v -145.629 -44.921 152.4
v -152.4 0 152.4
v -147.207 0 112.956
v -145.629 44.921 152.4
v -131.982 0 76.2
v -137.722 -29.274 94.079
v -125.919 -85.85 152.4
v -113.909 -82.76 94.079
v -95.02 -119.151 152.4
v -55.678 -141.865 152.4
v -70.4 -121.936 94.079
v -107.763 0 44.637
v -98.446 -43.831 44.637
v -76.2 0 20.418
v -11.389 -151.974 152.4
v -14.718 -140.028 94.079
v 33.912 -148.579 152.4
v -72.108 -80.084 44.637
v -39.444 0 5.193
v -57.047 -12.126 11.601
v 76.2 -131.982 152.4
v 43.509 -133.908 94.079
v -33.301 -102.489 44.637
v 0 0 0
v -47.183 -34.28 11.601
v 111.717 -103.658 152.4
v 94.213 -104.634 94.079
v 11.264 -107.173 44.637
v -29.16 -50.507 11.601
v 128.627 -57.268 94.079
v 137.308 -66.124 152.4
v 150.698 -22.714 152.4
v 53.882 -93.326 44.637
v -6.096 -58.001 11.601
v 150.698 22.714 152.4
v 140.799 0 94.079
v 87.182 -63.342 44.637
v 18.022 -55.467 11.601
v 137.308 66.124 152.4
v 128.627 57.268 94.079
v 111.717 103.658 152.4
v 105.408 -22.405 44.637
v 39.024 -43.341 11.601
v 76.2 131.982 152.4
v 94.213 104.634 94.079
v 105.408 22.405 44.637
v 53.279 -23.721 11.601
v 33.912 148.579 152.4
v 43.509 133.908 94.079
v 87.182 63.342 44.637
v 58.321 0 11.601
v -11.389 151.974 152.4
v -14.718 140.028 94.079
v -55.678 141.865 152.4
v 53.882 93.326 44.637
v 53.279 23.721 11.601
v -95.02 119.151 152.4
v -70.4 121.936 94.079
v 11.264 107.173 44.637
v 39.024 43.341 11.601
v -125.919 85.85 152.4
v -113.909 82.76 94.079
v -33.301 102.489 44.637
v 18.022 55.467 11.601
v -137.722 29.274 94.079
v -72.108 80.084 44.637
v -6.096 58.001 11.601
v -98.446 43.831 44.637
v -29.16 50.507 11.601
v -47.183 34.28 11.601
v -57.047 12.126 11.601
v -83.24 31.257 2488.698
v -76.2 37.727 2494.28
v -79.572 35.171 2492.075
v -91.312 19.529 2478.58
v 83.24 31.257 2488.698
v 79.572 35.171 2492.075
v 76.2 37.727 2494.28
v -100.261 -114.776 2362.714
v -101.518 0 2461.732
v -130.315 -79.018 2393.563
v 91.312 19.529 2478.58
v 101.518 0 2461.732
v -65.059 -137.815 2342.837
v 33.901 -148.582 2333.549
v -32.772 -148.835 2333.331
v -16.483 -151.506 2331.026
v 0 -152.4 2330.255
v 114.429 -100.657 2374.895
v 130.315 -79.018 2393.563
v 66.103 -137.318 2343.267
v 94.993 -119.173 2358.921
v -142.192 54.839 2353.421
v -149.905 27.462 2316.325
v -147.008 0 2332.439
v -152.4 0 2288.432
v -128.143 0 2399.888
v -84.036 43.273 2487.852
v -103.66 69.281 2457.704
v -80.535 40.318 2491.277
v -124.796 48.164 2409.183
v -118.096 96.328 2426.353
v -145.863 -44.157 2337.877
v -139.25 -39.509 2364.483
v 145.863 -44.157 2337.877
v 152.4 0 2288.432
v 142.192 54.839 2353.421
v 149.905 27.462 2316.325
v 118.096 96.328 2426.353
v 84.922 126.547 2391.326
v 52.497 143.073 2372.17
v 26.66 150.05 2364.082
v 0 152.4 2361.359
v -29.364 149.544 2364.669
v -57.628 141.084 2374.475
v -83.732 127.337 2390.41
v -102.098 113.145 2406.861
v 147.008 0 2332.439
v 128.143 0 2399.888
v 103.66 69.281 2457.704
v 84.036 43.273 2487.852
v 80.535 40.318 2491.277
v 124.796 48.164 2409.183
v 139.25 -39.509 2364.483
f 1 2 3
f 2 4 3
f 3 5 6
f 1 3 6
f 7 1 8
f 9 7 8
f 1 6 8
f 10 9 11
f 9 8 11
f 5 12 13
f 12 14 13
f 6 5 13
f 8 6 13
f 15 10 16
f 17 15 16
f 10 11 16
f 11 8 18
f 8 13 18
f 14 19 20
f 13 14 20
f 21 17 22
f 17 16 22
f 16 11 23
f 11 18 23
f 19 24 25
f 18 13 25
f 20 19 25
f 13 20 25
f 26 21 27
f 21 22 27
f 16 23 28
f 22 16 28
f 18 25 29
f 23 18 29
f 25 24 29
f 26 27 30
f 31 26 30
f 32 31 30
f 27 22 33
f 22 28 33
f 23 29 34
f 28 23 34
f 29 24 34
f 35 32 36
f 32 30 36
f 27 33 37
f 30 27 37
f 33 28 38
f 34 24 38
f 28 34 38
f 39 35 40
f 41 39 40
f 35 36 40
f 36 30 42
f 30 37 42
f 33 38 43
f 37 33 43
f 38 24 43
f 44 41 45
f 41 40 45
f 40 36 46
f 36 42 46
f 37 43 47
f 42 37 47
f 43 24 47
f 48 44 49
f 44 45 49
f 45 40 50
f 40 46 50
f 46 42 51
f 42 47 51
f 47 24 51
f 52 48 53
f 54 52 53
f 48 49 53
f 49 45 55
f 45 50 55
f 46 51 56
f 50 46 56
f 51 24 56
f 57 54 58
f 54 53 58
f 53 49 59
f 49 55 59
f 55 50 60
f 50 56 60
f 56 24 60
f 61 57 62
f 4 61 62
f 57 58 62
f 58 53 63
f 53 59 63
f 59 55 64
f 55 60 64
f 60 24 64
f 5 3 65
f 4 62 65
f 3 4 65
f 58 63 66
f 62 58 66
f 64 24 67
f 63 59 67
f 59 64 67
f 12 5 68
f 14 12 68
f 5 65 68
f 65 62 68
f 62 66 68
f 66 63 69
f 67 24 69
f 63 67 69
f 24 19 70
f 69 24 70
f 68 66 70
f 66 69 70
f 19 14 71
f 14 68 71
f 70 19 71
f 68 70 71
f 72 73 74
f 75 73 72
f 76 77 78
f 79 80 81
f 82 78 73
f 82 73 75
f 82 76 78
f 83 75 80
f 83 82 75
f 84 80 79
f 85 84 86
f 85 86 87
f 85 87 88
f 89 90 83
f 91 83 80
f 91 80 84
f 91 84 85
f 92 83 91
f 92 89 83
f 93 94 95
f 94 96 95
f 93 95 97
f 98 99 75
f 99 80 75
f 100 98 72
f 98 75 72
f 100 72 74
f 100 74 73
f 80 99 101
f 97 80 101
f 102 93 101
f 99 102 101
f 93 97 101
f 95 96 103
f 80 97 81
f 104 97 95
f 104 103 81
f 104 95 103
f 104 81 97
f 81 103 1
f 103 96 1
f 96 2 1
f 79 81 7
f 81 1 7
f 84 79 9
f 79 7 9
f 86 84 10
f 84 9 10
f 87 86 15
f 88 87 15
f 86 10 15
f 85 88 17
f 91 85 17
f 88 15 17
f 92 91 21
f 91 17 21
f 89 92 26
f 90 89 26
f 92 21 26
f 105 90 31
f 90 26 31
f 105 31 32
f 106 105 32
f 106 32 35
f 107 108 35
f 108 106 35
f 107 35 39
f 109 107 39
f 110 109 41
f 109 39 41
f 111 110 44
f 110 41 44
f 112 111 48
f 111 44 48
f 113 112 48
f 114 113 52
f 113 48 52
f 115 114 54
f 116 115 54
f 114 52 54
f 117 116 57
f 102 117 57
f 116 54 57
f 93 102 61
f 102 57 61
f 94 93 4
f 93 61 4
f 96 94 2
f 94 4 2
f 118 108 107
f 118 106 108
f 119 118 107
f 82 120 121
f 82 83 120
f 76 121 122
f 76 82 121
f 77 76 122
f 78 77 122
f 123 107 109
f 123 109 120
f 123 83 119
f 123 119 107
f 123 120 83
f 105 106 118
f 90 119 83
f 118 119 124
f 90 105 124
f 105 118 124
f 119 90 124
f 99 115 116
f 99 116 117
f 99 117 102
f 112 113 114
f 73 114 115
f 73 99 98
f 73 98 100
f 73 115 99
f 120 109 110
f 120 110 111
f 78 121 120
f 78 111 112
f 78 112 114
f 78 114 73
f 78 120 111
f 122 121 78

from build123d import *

# Parameters (mm, degrees)
SKETCH1_R           = 152.4
BOSS_EXTRUDE1_DEPTH = 2494.28
CUT_EXTRUDE1_DEPTH  = 203.2
CUT_EXTRUDE2_DEPTH  = 203.2
FILLET1_R           = 152.4


with BuildPart() as part:
    # Sketch1 → Boss-Extrude1 (new body)
    with BuildSketch(Plane.XY):
        with Locations(Location((0, 0, 0), (0, 0, 180))):
            Circle(SKETCH1_R)
    extrude(amount=BOSS_EXTRUDE1_DEPTH)

    # Sketch3 → Cut-Extrude1 (cut, symmetric)
    with BuildSketch(Plane(origin=(0, 0, 0), x_dir=(0, 0, -1), z_dir=(1, 0, 0))):
        Polygon((-2361.35850174, 152.4), (-2494.28, 37.727132557), (-2330.25519021, -152.4), (-2701.978592606, -152.4), (-2701.978592606, 152.4), align=None)
    extrude(amount=CUT_EXTRUDE1_DEPTH, both=True, mode=Mode.SUBTRACT)

    # Sketch4 → Cut-Extrude2 (cut, symmetric)
    with BuildSketch(Plane(origin=(0, 0, 0), x_dir=(1, 0, 0), z_dir=(0, 1, 0))):
        with BuildLine():
            Line((-274.668681528, -2288.432323773), (-274.668681528, -2617.629818427))
            Line((-274.668681528, -2617.629818427), (274.668681528, -2617.629818427))
            Line((274.668681528, -2617.629818427), (274.668681528, -2288.432323773))
            Line((274.668681528, -2288.432323773), (152.4, -2288.432323773))
            add(Edge.make_bspline(
                [(152.4, -2288.432323773), (152.4, -2456.068889623), (76.2, -2494.28)],
                knots=[0, 0, 0, 1, 1, 1], degree=2, weights=[1, 0.380231012, 1]))
            Line((76.2, -2494.28), (-76.2, -2494.28))
            add(Edge.make_bspline(
                [(-152.4, -2288.432323773), (-152.4, -2456.068889623), (-76.2, -2494.28)],
                knots=[0, 0, 0, 1, 1, 1], degree=2, weights=[1, 0.380231012, 1]))
            Line((-152.4, -2288.432323773), (-274.668681528, -2288.432323773))
        make_face()
    extrude(amount=CUT_EXTRUDE2_DEPTH, both=True, mode=Mode.SUBTRACT)

    # Fillet1
    fillet1_edges = [part.edges().sort_by_distance(p)[0] for p in [
        (152.4, 0, 0),
    ]]
    fillet(fillet1_edges, radius=FILLET1_R)


solid = part.part
